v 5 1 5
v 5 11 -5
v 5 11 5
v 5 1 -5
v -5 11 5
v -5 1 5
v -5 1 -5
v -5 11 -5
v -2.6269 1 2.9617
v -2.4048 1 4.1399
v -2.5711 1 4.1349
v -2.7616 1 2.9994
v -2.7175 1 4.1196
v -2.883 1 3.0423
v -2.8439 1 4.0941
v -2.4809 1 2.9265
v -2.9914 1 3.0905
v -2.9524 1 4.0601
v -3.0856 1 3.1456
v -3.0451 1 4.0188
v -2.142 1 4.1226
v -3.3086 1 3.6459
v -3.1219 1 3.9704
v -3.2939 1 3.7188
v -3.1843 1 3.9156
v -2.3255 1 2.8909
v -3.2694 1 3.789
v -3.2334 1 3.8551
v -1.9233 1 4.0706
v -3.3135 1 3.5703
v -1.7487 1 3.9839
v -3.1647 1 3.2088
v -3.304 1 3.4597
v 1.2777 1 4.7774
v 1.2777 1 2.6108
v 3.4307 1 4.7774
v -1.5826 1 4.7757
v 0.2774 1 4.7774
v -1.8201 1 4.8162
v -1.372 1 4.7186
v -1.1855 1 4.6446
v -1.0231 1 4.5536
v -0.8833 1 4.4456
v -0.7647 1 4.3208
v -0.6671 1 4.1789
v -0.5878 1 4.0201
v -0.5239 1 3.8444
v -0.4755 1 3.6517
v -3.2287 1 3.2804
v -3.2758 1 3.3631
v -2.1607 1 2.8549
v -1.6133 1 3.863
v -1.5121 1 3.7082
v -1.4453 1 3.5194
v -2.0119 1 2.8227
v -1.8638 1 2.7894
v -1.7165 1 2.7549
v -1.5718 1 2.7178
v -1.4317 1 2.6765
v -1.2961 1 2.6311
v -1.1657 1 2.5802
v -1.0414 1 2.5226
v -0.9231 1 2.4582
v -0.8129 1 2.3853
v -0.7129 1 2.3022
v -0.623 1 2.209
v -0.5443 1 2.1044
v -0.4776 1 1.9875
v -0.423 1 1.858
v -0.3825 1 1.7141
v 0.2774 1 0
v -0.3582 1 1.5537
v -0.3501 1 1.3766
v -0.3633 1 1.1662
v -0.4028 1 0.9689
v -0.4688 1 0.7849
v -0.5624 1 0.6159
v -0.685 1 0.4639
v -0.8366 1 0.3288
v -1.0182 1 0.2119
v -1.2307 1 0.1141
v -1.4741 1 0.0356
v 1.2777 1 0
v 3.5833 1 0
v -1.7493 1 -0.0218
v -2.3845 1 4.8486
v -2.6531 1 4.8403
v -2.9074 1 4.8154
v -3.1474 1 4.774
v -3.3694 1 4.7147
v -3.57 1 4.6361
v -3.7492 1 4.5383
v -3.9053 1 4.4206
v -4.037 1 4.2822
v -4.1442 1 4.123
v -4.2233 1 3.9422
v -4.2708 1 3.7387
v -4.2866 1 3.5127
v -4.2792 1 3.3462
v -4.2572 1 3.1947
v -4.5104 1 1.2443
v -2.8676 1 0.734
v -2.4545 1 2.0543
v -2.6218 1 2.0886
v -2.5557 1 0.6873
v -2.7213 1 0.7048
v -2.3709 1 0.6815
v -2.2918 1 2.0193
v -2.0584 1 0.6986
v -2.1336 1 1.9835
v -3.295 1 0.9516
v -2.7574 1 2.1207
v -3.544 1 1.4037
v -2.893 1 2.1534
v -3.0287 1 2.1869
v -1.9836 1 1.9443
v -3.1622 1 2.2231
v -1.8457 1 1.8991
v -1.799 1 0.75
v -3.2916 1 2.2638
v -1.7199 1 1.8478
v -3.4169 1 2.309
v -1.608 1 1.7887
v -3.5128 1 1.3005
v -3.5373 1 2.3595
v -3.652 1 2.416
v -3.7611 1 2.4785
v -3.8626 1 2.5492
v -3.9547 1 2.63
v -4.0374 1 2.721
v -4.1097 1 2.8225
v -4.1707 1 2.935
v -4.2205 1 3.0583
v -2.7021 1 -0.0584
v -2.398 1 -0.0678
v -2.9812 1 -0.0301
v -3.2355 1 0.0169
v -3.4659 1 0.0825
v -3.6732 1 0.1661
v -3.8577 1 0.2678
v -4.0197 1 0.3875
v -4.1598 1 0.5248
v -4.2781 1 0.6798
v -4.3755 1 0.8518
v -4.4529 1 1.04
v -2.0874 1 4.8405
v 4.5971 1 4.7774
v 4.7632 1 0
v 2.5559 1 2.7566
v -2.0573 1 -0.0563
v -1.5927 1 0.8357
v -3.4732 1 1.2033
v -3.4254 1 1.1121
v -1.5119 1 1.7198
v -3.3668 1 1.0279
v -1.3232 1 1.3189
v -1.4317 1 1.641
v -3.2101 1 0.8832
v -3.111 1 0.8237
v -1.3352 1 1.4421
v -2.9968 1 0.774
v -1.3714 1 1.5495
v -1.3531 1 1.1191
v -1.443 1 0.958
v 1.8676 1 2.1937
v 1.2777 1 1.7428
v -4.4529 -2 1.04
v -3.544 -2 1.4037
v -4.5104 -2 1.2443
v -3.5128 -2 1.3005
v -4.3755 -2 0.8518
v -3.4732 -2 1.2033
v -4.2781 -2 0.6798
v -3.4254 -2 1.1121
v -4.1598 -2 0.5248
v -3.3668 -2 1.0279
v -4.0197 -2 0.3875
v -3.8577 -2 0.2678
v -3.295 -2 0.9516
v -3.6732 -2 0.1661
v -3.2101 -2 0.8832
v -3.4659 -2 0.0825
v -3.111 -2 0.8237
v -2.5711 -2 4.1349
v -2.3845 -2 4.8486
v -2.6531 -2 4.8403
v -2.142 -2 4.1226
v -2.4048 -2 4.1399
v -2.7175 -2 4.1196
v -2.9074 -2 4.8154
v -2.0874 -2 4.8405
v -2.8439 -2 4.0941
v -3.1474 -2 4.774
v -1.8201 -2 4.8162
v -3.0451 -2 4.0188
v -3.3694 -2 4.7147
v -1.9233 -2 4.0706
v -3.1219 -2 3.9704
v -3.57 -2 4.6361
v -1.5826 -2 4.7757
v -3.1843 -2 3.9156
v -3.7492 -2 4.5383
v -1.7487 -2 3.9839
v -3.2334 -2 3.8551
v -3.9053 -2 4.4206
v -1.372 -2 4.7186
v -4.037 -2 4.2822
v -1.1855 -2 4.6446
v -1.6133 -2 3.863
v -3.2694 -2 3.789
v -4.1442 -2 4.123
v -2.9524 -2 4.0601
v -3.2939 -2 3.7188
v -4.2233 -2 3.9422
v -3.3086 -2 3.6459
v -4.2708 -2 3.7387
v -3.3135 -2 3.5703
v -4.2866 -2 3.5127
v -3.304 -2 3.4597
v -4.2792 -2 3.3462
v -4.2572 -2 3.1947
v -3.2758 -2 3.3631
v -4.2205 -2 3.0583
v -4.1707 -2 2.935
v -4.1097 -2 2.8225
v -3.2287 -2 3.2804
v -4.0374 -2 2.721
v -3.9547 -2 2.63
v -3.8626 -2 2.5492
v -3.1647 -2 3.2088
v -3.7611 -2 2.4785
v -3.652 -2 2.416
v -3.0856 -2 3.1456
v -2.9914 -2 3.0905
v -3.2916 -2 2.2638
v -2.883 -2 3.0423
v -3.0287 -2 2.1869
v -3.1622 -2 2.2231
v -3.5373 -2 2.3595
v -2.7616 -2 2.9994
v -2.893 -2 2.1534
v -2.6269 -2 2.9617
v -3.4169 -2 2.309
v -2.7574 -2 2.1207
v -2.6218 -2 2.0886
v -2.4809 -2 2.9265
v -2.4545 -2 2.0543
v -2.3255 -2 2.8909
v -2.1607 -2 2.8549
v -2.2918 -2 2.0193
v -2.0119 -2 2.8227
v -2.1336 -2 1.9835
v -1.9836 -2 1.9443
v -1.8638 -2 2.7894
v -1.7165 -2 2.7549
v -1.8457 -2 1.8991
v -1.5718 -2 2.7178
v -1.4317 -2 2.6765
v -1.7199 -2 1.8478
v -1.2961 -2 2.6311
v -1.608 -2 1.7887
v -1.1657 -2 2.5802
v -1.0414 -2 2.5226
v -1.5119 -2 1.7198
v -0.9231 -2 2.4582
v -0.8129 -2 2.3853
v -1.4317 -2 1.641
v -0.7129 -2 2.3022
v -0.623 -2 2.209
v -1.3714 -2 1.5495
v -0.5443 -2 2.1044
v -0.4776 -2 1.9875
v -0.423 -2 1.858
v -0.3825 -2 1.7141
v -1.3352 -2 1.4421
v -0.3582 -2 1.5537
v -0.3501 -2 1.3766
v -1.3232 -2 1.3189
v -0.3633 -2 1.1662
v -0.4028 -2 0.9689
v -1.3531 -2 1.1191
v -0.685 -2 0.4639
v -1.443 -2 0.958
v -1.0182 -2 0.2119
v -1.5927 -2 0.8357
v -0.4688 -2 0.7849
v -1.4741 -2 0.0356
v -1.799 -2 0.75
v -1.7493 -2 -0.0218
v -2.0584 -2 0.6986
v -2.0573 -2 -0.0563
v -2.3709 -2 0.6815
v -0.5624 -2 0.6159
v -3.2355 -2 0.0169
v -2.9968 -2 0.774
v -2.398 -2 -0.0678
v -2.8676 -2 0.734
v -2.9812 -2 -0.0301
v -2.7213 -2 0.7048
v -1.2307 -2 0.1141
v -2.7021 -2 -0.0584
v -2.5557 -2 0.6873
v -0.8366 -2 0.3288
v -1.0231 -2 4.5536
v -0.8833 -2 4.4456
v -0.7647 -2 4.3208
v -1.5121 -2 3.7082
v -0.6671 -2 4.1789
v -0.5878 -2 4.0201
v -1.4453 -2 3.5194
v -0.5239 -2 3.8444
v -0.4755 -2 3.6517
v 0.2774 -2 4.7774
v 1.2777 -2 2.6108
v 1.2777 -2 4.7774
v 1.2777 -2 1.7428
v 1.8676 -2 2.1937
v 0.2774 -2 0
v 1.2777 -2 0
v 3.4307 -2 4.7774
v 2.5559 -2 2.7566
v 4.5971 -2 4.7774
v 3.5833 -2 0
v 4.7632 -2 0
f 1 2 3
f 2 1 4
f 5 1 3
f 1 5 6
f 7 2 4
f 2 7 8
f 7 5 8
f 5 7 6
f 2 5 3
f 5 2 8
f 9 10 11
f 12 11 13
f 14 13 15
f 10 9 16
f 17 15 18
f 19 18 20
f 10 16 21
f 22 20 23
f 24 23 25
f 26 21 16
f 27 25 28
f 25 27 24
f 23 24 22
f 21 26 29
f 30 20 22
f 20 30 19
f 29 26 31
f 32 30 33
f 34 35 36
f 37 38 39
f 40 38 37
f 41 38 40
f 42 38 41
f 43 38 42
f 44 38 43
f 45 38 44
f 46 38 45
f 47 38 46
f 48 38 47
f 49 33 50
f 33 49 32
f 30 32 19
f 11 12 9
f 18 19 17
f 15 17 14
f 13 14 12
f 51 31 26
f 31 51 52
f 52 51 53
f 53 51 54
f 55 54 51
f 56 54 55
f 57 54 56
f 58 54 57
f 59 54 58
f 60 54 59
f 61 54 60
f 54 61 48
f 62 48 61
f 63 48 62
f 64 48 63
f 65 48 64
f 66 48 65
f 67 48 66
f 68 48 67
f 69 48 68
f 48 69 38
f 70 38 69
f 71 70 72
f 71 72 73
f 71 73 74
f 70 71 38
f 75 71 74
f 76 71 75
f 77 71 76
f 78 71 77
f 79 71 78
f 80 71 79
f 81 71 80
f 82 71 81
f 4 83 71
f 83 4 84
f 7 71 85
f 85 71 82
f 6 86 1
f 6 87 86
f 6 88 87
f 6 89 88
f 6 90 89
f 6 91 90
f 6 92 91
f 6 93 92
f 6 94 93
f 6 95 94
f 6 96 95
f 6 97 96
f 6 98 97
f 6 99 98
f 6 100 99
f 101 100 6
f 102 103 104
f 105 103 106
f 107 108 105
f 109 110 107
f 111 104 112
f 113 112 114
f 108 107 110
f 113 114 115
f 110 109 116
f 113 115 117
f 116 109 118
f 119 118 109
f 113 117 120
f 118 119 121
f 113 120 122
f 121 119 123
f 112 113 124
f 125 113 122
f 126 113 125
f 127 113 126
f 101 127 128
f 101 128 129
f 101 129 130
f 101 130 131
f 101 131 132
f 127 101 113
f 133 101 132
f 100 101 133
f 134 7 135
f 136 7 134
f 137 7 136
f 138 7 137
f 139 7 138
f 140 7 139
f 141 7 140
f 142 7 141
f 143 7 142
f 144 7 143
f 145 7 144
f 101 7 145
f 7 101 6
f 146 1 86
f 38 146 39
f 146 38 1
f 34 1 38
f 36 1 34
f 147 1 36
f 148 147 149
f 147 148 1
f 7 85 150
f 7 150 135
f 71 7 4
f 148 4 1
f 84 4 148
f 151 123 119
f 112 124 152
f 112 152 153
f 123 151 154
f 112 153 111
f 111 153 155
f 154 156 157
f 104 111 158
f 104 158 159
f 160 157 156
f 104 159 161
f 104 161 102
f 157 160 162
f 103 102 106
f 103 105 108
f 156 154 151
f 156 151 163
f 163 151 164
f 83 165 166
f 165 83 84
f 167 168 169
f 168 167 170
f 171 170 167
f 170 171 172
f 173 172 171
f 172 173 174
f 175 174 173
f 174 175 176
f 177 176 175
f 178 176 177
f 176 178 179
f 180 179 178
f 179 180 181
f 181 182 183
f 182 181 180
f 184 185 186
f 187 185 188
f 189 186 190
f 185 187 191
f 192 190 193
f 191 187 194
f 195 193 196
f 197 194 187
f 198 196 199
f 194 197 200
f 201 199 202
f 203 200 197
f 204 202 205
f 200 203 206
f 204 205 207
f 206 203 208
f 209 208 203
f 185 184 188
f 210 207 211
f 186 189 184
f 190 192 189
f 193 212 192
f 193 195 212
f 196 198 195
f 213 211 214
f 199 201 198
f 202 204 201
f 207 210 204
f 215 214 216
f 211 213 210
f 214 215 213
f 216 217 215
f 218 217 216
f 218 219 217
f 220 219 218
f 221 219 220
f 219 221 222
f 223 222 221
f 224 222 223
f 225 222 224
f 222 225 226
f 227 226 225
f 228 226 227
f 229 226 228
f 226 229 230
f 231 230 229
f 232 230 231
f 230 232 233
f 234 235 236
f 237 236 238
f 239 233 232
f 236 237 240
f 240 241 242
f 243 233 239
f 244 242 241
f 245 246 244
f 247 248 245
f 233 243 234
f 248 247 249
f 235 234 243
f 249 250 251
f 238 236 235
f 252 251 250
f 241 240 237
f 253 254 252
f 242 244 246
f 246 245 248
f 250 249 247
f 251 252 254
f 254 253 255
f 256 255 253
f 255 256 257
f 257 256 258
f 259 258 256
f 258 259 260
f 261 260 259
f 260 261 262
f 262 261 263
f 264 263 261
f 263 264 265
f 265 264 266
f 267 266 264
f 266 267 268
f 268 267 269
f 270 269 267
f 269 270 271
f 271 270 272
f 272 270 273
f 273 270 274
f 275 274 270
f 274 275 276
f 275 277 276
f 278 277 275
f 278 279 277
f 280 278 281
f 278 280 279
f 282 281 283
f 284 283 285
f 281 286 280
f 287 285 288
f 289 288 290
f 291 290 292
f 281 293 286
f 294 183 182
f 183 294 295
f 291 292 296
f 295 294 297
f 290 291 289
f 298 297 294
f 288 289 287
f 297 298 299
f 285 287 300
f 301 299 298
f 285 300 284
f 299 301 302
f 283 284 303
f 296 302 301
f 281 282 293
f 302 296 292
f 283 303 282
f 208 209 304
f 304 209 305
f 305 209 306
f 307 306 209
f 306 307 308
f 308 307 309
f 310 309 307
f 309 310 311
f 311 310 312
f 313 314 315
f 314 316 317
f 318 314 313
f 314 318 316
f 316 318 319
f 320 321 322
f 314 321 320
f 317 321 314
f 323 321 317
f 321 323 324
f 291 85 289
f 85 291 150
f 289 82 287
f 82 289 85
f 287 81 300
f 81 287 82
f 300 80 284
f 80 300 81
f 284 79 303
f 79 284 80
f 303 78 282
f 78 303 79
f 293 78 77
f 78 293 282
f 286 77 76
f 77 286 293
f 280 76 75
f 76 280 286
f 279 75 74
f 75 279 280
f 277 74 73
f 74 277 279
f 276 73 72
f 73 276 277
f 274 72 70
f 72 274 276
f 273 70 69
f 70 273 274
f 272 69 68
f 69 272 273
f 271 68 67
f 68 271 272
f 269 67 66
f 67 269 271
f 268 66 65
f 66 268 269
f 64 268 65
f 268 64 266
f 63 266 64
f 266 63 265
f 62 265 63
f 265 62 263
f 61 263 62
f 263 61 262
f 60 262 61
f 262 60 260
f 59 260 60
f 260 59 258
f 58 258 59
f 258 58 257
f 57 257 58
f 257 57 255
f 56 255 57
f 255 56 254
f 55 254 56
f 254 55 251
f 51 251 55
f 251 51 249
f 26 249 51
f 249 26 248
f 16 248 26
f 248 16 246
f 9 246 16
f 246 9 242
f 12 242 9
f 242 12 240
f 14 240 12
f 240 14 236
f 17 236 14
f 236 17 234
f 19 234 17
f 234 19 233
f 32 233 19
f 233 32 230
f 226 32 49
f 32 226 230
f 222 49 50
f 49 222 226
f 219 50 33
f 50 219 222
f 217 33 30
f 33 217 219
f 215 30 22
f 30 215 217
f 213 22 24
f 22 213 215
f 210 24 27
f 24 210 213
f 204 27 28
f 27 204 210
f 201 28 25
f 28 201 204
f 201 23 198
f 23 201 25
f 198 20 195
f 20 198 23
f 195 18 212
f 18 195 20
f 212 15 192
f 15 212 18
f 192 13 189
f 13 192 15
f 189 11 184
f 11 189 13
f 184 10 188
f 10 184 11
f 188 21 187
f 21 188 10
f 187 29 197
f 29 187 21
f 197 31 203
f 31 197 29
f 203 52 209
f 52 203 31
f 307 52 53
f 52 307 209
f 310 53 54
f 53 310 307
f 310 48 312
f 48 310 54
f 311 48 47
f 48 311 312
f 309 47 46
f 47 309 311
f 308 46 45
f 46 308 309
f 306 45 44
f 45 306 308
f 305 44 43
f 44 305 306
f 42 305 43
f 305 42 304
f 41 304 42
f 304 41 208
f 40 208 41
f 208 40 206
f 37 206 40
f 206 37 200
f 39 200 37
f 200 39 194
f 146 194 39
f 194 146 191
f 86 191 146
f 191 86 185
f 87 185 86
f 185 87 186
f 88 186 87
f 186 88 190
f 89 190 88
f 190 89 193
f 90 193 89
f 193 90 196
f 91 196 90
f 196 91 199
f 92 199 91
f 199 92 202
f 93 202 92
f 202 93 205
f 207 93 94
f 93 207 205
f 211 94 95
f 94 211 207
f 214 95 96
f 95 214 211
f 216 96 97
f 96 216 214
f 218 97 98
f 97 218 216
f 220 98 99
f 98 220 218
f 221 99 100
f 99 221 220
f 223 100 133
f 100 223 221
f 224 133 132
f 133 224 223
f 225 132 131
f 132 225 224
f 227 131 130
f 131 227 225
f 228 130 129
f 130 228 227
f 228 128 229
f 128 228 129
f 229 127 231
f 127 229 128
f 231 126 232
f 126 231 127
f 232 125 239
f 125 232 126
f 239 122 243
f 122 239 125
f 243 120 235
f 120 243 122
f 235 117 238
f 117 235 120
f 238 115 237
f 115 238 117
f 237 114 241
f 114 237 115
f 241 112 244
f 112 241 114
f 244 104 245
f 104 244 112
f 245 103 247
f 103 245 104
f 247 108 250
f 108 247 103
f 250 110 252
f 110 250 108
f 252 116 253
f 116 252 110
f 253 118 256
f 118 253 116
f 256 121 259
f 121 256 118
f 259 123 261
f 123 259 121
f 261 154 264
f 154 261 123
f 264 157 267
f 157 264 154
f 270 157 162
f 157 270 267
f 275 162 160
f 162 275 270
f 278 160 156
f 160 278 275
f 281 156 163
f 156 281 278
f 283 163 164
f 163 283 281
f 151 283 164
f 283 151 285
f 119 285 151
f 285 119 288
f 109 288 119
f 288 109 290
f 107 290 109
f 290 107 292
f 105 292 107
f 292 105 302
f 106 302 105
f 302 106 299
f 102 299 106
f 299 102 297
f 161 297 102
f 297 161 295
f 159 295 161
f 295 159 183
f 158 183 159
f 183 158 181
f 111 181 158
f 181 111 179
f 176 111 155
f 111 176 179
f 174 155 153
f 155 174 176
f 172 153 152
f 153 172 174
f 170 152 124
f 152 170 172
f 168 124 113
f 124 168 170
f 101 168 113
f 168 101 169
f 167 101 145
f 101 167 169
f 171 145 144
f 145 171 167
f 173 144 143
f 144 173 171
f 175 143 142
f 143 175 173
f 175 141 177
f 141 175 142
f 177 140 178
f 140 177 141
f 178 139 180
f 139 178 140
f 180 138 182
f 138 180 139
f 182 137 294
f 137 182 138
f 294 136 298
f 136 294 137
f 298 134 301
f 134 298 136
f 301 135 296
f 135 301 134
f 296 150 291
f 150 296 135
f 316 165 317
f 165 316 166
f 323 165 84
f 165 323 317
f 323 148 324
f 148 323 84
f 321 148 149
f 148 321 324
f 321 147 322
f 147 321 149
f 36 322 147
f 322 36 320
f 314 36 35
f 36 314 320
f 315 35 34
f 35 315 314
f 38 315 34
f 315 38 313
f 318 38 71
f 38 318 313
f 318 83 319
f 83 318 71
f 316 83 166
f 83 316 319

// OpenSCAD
// file: scad_text.scad
/*
 * scad_text.scad
 * This library has useful functions for adding 3D text
 * to objects with or without a pedestal (for vertical/sheer text)
 * @author: Suyash Kumar <suyashkumar2003@gmail.com>
 */


module makeText(textIn, depth, size=3.5) {
    linear_extrude(height=depth,center = true, convexity = 10, slices = 19, scale = 1.0) text(textIn,halign="center",size=size,font="Helvetica:style=Bold");
}
module makePedestal(textIn, depth){
    // Assumes a text size of 3.5.
    len_per_letter=3.3;
    base_width=len_per_letter*len(textIn); 
    difference(){
        translate([0,-2.5,0]) cube([base_width,5,4], center=true);
        rotate([40,0,0]) translate([0,-2.5,4]) cube([base_width+1,7,4], center=true);
    }
}
module writeTextWithPedestal(x, y, z, textIn, depth=4){
    translate([x,y,z]) rotate([90,0,0]) union() {
            makeText(textIn, depth);
            makePedestal(textIn, depth);
    }
}
module writeText(x, y, z, textIn, depth=4, size=5) {
        translate([x,y,z]) rotate([90,0,0]) makeText(textIn, depth, size);
}


// writeTextWithPedestal(0,0,0,"SK",4);
// main file
/*
 * example.scad
 * Shows a quick example of using the scad_text library
 * @author: Suyash Kumar <suyashkumar2003@gmail.com>
 */

include <scad_text.scad>

translate([0,6,0])cube(10, center=true);
writeText(0,0,0, "SK", pedestal=1);
